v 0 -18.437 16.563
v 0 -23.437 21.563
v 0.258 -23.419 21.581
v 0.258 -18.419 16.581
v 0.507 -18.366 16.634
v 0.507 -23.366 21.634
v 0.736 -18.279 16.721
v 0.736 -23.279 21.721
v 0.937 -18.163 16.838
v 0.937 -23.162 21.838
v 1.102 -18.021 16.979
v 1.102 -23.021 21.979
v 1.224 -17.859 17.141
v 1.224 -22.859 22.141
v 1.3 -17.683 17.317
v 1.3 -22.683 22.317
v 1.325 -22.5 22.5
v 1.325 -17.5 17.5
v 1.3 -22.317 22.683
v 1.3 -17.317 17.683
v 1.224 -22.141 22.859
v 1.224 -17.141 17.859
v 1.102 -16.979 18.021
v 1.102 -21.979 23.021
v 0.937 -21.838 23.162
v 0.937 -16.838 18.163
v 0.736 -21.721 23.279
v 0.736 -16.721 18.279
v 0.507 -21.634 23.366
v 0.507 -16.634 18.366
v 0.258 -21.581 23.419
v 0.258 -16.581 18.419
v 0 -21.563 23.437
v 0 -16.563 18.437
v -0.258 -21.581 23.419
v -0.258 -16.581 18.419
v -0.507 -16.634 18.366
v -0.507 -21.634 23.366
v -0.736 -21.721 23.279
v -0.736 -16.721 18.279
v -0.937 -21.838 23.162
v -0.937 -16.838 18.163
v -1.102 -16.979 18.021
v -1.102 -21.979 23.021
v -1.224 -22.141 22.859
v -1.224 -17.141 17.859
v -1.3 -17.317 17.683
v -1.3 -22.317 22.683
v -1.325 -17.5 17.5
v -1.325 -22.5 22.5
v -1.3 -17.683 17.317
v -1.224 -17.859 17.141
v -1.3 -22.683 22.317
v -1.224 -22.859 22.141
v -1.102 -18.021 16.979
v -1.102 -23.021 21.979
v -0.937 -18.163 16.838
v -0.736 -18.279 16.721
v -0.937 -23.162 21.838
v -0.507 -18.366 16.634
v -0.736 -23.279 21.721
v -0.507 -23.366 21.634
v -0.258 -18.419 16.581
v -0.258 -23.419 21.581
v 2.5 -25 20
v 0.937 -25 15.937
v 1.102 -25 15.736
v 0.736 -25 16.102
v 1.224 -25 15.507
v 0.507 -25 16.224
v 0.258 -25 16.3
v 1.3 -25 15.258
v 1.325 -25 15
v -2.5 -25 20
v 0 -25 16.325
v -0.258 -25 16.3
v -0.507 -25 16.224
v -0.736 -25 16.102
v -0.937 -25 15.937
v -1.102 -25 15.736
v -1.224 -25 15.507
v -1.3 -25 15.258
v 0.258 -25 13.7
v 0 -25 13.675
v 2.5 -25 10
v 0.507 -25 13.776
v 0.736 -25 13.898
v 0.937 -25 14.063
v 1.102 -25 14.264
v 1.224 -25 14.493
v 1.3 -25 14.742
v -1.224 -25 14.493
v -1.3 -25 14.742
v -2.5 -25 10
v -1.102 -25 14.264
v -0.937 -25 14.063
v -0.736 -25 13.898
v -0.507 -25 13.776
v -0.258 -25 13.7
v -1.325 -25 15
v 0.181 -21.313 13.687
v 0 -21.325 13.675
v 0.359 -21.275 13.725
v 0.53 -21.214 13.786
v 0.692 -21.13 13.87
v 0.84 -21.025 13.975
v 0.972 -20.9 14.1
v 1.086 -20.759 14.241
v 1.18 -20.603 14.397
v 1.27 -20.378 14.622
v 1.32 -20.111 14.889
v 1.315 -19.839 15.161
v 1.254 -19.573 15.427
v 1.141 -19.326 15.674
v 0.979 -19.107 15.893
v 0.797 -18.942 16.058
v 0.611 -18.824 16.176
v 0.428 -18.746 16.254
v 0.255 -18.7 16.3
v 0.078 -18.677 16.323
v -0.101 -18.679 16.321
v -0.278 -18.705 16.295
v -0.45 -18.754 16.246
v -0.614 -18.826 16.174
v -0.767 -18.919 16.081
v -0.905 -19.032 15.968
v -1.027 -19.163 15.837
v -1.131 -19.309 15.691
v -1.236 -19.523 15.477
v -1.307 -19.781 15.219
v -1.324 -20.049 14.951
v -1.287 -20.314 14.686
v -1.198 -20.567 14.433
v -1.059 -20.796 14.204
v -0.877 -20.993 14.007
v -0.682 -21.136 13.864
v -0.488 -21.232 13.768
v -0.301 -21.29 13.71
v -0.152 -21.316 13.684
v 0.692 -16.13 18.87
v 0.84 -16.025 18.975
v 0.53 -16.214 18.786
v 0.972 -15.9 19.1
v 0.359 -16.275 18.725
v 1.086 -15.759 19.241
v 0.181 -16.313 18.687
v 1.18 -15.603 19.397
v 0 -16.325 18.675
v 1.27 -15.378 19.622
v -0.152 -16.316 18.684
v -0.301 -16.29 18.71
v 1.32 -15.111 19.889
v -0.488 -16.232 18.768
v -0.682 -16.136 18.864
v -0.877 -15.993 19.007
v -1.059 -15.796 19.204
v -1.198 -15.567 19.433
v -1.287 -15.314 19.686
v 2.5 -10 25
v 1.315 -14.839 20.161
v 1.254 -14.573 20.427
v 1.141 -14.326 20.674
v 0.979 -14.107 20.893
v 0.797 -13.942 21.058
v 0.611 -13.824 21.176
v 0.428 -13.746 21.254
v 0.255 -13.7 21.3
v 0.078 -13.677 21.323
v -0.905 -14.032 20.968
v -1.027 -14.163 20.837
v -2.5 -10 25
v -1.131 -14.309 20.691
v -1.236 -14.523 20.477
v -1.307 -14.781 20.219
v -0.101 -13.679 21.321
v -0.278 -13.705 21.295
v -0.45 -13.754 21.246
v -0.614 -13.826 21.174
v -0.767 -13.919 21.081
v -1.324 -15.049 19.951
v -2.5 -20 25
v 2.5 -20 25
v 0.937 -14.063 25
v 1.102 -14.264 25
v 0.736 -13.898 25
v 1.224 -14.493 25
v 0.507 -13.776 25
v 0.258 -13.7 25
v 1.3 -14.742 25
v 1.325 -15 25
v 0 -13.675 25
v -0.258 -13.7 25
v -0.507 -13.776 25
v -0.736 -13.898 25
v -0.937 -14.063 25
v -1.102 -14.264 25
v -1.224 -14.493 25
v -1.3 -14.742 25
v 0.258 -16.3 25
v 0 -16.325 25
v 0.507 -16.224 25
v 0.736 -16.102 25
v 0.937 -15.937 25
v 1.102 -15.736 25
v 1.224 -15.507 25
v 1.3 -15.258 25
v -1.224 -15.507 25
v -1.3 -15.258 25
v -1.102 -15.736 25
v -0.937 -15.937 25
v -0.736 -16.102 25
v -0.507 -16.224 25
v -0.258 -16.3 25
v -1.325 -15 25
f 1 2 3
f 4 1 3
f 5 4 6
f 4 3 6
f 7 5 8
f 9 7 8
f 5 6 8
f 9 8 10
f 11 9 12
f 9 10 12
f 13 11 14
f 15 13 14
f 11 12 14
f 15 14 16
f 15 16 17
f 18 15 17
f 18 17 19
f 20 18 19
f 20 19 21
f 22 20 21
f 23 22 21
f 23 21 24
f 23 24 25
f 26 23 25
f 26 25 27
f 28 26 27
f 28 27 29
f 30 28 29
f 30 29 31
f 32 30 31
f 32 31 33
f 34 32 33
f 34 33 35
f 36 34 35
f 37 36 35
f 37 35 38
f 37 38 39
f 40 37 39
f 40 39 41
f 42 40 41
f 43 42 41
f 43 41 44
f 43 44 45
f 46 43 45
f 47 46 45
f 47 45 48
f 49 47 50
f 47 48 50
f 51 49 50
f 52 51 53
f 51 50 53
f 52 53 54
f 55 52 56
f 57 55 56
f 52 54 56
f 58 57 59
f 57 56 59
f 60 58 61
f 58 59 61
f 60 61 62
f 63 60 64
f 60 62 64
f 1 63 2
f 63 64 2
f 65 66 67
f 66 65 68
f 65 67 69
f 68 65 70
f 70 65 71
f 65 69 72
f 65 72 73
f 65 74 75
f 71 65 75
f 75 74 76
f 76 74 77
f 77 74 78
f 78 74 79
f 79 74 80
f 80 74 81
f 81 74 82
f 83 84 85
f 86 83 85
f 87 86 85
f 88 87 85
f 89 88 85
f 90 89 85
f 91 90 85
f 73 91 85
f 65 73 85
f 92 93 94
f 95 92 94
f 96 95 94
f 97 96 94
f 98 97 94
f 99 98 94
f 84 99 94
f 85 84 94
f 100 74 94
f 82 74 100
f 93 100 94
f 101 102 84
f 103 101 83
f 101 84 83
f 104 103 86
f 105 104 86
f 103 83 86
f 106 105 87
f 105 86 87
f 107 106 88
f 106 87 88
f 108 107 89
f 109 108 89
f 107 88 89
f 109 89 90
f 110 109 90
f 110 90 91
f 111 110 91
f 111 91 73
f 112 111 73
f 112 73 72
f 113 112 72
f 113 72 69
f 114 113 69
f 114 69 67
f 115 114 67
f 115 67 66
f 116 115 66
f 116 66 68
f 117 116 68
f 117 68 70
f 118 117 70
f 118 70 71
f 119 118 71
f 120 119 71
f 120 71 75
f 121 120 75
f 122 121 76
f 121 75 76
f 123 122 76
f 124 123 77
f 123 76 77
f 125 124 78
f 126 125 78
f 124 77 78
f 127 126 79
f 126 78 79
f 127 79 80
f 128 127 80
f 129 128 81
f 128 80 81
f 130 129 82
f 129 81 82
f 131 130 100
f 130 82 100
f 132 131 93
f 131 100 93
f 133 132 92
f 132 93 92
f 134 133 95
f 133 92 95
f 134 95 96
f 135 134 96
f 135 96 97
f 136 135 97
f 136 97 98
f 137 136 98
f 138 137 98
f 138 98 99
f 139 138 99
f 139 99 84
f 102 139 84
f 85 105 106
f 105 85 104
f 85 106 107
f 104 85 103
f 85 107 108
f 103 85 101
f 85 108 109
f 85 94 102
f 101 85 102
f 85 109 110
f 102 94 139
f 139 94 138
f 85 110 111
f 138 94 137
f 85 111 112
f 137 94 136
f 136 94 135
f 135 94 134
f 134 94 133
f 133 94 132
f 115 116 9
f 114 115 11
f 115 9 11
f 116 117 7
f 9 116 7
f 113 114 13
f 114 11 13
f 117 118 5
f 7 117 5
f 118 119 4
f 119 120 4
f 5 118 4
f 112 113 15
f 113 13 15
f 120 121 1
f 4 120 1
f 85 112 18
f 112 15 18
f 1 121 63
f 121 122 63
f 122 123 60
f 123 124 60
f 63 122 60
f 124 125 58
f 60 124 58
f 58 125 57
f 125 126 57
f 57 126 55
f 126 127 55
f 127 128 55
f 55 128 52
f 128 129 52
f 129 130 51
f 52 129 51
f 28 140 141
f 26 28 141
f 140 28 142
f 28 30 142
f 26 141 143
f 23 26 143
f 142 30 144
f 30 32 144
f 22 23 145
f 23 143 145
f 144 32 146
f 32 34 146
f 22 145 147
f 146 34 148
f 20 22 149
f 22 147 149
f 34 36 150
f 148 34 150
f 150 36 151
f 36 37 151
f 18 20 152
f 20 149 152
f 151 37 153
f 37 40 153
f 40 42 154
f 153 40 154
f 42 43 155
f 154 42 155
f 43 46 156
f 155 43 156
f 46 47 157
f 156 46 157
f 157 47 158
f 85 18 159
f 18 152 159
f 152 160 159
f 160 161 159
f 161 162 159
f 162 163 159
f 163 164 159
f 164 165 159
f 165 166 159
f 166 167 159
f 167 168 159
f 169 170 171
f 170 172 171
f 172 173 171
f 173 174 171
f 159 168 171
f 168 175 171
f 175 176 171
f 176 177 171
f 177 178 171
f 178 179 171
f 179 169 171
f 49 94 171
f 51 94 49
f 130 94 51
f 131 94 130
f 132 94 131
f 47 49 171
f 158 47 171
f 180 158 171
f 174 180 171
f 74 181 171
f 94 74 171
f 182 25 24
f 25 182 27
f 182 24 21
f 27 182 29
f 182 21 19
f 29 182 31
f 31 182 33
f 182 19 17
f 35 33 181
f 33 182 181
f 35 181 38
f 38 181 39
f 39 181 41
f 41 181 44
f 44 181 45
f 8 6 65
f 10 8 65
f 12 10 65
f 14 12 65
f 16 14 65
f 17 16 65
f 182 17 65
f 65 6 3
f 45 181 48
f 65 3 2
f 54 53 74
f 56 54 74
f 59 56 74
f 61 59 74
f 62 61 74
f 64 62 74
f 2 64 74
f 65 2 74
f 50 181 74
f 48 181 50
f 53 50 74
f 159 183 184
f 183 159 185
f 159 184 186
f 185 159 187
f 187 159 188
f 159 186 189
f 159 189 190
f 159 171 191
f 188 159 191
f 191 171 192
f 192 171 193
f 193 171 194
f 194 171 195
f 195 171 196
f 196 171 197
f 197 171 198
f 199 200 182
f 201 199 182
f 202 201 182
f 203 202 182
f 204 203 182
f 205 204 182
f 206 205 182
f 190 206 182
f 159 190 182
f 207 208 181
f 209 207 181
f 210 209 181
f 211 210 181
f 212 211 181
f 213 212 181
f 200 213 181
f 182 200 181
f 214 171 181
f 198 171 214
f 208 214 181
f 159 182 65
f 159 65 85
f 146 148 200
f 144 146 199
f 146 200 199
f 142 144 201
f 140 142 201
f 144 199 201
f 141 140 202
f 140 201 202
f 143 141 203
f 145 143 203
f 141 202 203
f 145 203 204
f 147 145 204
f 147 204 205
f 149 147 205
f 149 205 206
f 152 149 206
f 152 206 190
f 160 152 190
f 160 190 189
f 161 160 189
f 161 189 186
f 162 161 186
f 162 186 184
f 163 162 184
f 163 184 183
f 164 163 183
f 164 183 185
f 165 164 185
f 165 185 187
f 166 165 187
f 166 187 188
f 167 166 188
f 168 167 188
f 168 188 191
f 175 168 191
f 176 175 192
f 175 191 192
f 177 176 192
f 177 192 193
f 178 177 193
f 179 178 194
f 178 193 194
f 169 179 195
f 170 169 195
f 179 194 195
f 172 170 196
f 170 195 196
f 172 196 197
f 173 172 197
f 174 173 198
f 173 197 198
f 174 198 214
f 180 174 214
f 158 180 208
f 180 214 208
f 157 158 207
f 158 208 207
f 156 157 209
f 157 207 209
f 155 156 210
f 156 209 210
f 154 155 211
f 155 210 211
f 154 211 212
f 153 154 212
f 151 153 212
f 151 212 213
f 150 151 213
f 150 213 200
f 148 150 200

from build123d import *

# Parameters (mm, degrees)
PAD_DEPTH               = 5
SKETCH001_R             = 1.325
HOLE_DEPTH              = 15.0010000001
SKETCH002_R             = 1.325
HOLE001_DEPTH           = 17.6786695297
SKETCH003_R             = 1.325
HOLE002_DEPTH           = 15.001
BODY001_PLACEMENT_ANGLE = 90


with BuildPart() as part:
    # Sketch → Pad (new body)
    with BuildSketch(Plane.XZ.offset(-2.5)):
        Polygon((-10, 25.0000000001), (-19.9999999999, 25.0000000001), (-25, 20), (-25, 10), align=None)
    extrude(amount=PAD_DEPTH)

    # Sketch001 (on Face1 of Pad) → Hole (cut, through all)
    with BuildSketch(Plane(origin=(0, 0, 25.0000000001), x_dir=(-1, 0, 0), z_dir=(0, 0, 1))):
        with Locations((15, 0)):
            Circle(SKETCH001_R)
    extrude(amount=-HOLE_DEPTH, mode=Mode.SUBTRACT)

    # Sketch002 (on Face5 of Hole) → Hole001 (cut, through all)
    with BuildSketch(Plane(origin=(-22.5, 0, 22.5), x_dir=(-0.7071067812, 0, -0.7071067812), z_dir=(-0.7071067812, 0, 0.7071067812))):
        Circle(SKETCH002_R)
    extrude(amount=-HOLE001_DEPTH, mode=Mode.SUBTRACT)

    # Sketch003 (on Face7 of Hole001) → Hole002 (cut, through all)
    with BuildSketch(Plane(origin=(-25, 0, 0), x_dir=(0, 0, -1), z_dir=(-1, 0, 0))):
        with Locations((-15, 0)):
            Circle(SKETCH003_R)
    extrude(amount=-HOLE002_DEPTH, mode=Mode.SUBTRACT)


with BuildPart() as part_1:
    # Body001 placement: moved
    add(part.part.rotate(Axis((0, 0, 0), (0, 0, 1)), BODY001_PLACEMENT_ANGLE))


solid = part_1.part
